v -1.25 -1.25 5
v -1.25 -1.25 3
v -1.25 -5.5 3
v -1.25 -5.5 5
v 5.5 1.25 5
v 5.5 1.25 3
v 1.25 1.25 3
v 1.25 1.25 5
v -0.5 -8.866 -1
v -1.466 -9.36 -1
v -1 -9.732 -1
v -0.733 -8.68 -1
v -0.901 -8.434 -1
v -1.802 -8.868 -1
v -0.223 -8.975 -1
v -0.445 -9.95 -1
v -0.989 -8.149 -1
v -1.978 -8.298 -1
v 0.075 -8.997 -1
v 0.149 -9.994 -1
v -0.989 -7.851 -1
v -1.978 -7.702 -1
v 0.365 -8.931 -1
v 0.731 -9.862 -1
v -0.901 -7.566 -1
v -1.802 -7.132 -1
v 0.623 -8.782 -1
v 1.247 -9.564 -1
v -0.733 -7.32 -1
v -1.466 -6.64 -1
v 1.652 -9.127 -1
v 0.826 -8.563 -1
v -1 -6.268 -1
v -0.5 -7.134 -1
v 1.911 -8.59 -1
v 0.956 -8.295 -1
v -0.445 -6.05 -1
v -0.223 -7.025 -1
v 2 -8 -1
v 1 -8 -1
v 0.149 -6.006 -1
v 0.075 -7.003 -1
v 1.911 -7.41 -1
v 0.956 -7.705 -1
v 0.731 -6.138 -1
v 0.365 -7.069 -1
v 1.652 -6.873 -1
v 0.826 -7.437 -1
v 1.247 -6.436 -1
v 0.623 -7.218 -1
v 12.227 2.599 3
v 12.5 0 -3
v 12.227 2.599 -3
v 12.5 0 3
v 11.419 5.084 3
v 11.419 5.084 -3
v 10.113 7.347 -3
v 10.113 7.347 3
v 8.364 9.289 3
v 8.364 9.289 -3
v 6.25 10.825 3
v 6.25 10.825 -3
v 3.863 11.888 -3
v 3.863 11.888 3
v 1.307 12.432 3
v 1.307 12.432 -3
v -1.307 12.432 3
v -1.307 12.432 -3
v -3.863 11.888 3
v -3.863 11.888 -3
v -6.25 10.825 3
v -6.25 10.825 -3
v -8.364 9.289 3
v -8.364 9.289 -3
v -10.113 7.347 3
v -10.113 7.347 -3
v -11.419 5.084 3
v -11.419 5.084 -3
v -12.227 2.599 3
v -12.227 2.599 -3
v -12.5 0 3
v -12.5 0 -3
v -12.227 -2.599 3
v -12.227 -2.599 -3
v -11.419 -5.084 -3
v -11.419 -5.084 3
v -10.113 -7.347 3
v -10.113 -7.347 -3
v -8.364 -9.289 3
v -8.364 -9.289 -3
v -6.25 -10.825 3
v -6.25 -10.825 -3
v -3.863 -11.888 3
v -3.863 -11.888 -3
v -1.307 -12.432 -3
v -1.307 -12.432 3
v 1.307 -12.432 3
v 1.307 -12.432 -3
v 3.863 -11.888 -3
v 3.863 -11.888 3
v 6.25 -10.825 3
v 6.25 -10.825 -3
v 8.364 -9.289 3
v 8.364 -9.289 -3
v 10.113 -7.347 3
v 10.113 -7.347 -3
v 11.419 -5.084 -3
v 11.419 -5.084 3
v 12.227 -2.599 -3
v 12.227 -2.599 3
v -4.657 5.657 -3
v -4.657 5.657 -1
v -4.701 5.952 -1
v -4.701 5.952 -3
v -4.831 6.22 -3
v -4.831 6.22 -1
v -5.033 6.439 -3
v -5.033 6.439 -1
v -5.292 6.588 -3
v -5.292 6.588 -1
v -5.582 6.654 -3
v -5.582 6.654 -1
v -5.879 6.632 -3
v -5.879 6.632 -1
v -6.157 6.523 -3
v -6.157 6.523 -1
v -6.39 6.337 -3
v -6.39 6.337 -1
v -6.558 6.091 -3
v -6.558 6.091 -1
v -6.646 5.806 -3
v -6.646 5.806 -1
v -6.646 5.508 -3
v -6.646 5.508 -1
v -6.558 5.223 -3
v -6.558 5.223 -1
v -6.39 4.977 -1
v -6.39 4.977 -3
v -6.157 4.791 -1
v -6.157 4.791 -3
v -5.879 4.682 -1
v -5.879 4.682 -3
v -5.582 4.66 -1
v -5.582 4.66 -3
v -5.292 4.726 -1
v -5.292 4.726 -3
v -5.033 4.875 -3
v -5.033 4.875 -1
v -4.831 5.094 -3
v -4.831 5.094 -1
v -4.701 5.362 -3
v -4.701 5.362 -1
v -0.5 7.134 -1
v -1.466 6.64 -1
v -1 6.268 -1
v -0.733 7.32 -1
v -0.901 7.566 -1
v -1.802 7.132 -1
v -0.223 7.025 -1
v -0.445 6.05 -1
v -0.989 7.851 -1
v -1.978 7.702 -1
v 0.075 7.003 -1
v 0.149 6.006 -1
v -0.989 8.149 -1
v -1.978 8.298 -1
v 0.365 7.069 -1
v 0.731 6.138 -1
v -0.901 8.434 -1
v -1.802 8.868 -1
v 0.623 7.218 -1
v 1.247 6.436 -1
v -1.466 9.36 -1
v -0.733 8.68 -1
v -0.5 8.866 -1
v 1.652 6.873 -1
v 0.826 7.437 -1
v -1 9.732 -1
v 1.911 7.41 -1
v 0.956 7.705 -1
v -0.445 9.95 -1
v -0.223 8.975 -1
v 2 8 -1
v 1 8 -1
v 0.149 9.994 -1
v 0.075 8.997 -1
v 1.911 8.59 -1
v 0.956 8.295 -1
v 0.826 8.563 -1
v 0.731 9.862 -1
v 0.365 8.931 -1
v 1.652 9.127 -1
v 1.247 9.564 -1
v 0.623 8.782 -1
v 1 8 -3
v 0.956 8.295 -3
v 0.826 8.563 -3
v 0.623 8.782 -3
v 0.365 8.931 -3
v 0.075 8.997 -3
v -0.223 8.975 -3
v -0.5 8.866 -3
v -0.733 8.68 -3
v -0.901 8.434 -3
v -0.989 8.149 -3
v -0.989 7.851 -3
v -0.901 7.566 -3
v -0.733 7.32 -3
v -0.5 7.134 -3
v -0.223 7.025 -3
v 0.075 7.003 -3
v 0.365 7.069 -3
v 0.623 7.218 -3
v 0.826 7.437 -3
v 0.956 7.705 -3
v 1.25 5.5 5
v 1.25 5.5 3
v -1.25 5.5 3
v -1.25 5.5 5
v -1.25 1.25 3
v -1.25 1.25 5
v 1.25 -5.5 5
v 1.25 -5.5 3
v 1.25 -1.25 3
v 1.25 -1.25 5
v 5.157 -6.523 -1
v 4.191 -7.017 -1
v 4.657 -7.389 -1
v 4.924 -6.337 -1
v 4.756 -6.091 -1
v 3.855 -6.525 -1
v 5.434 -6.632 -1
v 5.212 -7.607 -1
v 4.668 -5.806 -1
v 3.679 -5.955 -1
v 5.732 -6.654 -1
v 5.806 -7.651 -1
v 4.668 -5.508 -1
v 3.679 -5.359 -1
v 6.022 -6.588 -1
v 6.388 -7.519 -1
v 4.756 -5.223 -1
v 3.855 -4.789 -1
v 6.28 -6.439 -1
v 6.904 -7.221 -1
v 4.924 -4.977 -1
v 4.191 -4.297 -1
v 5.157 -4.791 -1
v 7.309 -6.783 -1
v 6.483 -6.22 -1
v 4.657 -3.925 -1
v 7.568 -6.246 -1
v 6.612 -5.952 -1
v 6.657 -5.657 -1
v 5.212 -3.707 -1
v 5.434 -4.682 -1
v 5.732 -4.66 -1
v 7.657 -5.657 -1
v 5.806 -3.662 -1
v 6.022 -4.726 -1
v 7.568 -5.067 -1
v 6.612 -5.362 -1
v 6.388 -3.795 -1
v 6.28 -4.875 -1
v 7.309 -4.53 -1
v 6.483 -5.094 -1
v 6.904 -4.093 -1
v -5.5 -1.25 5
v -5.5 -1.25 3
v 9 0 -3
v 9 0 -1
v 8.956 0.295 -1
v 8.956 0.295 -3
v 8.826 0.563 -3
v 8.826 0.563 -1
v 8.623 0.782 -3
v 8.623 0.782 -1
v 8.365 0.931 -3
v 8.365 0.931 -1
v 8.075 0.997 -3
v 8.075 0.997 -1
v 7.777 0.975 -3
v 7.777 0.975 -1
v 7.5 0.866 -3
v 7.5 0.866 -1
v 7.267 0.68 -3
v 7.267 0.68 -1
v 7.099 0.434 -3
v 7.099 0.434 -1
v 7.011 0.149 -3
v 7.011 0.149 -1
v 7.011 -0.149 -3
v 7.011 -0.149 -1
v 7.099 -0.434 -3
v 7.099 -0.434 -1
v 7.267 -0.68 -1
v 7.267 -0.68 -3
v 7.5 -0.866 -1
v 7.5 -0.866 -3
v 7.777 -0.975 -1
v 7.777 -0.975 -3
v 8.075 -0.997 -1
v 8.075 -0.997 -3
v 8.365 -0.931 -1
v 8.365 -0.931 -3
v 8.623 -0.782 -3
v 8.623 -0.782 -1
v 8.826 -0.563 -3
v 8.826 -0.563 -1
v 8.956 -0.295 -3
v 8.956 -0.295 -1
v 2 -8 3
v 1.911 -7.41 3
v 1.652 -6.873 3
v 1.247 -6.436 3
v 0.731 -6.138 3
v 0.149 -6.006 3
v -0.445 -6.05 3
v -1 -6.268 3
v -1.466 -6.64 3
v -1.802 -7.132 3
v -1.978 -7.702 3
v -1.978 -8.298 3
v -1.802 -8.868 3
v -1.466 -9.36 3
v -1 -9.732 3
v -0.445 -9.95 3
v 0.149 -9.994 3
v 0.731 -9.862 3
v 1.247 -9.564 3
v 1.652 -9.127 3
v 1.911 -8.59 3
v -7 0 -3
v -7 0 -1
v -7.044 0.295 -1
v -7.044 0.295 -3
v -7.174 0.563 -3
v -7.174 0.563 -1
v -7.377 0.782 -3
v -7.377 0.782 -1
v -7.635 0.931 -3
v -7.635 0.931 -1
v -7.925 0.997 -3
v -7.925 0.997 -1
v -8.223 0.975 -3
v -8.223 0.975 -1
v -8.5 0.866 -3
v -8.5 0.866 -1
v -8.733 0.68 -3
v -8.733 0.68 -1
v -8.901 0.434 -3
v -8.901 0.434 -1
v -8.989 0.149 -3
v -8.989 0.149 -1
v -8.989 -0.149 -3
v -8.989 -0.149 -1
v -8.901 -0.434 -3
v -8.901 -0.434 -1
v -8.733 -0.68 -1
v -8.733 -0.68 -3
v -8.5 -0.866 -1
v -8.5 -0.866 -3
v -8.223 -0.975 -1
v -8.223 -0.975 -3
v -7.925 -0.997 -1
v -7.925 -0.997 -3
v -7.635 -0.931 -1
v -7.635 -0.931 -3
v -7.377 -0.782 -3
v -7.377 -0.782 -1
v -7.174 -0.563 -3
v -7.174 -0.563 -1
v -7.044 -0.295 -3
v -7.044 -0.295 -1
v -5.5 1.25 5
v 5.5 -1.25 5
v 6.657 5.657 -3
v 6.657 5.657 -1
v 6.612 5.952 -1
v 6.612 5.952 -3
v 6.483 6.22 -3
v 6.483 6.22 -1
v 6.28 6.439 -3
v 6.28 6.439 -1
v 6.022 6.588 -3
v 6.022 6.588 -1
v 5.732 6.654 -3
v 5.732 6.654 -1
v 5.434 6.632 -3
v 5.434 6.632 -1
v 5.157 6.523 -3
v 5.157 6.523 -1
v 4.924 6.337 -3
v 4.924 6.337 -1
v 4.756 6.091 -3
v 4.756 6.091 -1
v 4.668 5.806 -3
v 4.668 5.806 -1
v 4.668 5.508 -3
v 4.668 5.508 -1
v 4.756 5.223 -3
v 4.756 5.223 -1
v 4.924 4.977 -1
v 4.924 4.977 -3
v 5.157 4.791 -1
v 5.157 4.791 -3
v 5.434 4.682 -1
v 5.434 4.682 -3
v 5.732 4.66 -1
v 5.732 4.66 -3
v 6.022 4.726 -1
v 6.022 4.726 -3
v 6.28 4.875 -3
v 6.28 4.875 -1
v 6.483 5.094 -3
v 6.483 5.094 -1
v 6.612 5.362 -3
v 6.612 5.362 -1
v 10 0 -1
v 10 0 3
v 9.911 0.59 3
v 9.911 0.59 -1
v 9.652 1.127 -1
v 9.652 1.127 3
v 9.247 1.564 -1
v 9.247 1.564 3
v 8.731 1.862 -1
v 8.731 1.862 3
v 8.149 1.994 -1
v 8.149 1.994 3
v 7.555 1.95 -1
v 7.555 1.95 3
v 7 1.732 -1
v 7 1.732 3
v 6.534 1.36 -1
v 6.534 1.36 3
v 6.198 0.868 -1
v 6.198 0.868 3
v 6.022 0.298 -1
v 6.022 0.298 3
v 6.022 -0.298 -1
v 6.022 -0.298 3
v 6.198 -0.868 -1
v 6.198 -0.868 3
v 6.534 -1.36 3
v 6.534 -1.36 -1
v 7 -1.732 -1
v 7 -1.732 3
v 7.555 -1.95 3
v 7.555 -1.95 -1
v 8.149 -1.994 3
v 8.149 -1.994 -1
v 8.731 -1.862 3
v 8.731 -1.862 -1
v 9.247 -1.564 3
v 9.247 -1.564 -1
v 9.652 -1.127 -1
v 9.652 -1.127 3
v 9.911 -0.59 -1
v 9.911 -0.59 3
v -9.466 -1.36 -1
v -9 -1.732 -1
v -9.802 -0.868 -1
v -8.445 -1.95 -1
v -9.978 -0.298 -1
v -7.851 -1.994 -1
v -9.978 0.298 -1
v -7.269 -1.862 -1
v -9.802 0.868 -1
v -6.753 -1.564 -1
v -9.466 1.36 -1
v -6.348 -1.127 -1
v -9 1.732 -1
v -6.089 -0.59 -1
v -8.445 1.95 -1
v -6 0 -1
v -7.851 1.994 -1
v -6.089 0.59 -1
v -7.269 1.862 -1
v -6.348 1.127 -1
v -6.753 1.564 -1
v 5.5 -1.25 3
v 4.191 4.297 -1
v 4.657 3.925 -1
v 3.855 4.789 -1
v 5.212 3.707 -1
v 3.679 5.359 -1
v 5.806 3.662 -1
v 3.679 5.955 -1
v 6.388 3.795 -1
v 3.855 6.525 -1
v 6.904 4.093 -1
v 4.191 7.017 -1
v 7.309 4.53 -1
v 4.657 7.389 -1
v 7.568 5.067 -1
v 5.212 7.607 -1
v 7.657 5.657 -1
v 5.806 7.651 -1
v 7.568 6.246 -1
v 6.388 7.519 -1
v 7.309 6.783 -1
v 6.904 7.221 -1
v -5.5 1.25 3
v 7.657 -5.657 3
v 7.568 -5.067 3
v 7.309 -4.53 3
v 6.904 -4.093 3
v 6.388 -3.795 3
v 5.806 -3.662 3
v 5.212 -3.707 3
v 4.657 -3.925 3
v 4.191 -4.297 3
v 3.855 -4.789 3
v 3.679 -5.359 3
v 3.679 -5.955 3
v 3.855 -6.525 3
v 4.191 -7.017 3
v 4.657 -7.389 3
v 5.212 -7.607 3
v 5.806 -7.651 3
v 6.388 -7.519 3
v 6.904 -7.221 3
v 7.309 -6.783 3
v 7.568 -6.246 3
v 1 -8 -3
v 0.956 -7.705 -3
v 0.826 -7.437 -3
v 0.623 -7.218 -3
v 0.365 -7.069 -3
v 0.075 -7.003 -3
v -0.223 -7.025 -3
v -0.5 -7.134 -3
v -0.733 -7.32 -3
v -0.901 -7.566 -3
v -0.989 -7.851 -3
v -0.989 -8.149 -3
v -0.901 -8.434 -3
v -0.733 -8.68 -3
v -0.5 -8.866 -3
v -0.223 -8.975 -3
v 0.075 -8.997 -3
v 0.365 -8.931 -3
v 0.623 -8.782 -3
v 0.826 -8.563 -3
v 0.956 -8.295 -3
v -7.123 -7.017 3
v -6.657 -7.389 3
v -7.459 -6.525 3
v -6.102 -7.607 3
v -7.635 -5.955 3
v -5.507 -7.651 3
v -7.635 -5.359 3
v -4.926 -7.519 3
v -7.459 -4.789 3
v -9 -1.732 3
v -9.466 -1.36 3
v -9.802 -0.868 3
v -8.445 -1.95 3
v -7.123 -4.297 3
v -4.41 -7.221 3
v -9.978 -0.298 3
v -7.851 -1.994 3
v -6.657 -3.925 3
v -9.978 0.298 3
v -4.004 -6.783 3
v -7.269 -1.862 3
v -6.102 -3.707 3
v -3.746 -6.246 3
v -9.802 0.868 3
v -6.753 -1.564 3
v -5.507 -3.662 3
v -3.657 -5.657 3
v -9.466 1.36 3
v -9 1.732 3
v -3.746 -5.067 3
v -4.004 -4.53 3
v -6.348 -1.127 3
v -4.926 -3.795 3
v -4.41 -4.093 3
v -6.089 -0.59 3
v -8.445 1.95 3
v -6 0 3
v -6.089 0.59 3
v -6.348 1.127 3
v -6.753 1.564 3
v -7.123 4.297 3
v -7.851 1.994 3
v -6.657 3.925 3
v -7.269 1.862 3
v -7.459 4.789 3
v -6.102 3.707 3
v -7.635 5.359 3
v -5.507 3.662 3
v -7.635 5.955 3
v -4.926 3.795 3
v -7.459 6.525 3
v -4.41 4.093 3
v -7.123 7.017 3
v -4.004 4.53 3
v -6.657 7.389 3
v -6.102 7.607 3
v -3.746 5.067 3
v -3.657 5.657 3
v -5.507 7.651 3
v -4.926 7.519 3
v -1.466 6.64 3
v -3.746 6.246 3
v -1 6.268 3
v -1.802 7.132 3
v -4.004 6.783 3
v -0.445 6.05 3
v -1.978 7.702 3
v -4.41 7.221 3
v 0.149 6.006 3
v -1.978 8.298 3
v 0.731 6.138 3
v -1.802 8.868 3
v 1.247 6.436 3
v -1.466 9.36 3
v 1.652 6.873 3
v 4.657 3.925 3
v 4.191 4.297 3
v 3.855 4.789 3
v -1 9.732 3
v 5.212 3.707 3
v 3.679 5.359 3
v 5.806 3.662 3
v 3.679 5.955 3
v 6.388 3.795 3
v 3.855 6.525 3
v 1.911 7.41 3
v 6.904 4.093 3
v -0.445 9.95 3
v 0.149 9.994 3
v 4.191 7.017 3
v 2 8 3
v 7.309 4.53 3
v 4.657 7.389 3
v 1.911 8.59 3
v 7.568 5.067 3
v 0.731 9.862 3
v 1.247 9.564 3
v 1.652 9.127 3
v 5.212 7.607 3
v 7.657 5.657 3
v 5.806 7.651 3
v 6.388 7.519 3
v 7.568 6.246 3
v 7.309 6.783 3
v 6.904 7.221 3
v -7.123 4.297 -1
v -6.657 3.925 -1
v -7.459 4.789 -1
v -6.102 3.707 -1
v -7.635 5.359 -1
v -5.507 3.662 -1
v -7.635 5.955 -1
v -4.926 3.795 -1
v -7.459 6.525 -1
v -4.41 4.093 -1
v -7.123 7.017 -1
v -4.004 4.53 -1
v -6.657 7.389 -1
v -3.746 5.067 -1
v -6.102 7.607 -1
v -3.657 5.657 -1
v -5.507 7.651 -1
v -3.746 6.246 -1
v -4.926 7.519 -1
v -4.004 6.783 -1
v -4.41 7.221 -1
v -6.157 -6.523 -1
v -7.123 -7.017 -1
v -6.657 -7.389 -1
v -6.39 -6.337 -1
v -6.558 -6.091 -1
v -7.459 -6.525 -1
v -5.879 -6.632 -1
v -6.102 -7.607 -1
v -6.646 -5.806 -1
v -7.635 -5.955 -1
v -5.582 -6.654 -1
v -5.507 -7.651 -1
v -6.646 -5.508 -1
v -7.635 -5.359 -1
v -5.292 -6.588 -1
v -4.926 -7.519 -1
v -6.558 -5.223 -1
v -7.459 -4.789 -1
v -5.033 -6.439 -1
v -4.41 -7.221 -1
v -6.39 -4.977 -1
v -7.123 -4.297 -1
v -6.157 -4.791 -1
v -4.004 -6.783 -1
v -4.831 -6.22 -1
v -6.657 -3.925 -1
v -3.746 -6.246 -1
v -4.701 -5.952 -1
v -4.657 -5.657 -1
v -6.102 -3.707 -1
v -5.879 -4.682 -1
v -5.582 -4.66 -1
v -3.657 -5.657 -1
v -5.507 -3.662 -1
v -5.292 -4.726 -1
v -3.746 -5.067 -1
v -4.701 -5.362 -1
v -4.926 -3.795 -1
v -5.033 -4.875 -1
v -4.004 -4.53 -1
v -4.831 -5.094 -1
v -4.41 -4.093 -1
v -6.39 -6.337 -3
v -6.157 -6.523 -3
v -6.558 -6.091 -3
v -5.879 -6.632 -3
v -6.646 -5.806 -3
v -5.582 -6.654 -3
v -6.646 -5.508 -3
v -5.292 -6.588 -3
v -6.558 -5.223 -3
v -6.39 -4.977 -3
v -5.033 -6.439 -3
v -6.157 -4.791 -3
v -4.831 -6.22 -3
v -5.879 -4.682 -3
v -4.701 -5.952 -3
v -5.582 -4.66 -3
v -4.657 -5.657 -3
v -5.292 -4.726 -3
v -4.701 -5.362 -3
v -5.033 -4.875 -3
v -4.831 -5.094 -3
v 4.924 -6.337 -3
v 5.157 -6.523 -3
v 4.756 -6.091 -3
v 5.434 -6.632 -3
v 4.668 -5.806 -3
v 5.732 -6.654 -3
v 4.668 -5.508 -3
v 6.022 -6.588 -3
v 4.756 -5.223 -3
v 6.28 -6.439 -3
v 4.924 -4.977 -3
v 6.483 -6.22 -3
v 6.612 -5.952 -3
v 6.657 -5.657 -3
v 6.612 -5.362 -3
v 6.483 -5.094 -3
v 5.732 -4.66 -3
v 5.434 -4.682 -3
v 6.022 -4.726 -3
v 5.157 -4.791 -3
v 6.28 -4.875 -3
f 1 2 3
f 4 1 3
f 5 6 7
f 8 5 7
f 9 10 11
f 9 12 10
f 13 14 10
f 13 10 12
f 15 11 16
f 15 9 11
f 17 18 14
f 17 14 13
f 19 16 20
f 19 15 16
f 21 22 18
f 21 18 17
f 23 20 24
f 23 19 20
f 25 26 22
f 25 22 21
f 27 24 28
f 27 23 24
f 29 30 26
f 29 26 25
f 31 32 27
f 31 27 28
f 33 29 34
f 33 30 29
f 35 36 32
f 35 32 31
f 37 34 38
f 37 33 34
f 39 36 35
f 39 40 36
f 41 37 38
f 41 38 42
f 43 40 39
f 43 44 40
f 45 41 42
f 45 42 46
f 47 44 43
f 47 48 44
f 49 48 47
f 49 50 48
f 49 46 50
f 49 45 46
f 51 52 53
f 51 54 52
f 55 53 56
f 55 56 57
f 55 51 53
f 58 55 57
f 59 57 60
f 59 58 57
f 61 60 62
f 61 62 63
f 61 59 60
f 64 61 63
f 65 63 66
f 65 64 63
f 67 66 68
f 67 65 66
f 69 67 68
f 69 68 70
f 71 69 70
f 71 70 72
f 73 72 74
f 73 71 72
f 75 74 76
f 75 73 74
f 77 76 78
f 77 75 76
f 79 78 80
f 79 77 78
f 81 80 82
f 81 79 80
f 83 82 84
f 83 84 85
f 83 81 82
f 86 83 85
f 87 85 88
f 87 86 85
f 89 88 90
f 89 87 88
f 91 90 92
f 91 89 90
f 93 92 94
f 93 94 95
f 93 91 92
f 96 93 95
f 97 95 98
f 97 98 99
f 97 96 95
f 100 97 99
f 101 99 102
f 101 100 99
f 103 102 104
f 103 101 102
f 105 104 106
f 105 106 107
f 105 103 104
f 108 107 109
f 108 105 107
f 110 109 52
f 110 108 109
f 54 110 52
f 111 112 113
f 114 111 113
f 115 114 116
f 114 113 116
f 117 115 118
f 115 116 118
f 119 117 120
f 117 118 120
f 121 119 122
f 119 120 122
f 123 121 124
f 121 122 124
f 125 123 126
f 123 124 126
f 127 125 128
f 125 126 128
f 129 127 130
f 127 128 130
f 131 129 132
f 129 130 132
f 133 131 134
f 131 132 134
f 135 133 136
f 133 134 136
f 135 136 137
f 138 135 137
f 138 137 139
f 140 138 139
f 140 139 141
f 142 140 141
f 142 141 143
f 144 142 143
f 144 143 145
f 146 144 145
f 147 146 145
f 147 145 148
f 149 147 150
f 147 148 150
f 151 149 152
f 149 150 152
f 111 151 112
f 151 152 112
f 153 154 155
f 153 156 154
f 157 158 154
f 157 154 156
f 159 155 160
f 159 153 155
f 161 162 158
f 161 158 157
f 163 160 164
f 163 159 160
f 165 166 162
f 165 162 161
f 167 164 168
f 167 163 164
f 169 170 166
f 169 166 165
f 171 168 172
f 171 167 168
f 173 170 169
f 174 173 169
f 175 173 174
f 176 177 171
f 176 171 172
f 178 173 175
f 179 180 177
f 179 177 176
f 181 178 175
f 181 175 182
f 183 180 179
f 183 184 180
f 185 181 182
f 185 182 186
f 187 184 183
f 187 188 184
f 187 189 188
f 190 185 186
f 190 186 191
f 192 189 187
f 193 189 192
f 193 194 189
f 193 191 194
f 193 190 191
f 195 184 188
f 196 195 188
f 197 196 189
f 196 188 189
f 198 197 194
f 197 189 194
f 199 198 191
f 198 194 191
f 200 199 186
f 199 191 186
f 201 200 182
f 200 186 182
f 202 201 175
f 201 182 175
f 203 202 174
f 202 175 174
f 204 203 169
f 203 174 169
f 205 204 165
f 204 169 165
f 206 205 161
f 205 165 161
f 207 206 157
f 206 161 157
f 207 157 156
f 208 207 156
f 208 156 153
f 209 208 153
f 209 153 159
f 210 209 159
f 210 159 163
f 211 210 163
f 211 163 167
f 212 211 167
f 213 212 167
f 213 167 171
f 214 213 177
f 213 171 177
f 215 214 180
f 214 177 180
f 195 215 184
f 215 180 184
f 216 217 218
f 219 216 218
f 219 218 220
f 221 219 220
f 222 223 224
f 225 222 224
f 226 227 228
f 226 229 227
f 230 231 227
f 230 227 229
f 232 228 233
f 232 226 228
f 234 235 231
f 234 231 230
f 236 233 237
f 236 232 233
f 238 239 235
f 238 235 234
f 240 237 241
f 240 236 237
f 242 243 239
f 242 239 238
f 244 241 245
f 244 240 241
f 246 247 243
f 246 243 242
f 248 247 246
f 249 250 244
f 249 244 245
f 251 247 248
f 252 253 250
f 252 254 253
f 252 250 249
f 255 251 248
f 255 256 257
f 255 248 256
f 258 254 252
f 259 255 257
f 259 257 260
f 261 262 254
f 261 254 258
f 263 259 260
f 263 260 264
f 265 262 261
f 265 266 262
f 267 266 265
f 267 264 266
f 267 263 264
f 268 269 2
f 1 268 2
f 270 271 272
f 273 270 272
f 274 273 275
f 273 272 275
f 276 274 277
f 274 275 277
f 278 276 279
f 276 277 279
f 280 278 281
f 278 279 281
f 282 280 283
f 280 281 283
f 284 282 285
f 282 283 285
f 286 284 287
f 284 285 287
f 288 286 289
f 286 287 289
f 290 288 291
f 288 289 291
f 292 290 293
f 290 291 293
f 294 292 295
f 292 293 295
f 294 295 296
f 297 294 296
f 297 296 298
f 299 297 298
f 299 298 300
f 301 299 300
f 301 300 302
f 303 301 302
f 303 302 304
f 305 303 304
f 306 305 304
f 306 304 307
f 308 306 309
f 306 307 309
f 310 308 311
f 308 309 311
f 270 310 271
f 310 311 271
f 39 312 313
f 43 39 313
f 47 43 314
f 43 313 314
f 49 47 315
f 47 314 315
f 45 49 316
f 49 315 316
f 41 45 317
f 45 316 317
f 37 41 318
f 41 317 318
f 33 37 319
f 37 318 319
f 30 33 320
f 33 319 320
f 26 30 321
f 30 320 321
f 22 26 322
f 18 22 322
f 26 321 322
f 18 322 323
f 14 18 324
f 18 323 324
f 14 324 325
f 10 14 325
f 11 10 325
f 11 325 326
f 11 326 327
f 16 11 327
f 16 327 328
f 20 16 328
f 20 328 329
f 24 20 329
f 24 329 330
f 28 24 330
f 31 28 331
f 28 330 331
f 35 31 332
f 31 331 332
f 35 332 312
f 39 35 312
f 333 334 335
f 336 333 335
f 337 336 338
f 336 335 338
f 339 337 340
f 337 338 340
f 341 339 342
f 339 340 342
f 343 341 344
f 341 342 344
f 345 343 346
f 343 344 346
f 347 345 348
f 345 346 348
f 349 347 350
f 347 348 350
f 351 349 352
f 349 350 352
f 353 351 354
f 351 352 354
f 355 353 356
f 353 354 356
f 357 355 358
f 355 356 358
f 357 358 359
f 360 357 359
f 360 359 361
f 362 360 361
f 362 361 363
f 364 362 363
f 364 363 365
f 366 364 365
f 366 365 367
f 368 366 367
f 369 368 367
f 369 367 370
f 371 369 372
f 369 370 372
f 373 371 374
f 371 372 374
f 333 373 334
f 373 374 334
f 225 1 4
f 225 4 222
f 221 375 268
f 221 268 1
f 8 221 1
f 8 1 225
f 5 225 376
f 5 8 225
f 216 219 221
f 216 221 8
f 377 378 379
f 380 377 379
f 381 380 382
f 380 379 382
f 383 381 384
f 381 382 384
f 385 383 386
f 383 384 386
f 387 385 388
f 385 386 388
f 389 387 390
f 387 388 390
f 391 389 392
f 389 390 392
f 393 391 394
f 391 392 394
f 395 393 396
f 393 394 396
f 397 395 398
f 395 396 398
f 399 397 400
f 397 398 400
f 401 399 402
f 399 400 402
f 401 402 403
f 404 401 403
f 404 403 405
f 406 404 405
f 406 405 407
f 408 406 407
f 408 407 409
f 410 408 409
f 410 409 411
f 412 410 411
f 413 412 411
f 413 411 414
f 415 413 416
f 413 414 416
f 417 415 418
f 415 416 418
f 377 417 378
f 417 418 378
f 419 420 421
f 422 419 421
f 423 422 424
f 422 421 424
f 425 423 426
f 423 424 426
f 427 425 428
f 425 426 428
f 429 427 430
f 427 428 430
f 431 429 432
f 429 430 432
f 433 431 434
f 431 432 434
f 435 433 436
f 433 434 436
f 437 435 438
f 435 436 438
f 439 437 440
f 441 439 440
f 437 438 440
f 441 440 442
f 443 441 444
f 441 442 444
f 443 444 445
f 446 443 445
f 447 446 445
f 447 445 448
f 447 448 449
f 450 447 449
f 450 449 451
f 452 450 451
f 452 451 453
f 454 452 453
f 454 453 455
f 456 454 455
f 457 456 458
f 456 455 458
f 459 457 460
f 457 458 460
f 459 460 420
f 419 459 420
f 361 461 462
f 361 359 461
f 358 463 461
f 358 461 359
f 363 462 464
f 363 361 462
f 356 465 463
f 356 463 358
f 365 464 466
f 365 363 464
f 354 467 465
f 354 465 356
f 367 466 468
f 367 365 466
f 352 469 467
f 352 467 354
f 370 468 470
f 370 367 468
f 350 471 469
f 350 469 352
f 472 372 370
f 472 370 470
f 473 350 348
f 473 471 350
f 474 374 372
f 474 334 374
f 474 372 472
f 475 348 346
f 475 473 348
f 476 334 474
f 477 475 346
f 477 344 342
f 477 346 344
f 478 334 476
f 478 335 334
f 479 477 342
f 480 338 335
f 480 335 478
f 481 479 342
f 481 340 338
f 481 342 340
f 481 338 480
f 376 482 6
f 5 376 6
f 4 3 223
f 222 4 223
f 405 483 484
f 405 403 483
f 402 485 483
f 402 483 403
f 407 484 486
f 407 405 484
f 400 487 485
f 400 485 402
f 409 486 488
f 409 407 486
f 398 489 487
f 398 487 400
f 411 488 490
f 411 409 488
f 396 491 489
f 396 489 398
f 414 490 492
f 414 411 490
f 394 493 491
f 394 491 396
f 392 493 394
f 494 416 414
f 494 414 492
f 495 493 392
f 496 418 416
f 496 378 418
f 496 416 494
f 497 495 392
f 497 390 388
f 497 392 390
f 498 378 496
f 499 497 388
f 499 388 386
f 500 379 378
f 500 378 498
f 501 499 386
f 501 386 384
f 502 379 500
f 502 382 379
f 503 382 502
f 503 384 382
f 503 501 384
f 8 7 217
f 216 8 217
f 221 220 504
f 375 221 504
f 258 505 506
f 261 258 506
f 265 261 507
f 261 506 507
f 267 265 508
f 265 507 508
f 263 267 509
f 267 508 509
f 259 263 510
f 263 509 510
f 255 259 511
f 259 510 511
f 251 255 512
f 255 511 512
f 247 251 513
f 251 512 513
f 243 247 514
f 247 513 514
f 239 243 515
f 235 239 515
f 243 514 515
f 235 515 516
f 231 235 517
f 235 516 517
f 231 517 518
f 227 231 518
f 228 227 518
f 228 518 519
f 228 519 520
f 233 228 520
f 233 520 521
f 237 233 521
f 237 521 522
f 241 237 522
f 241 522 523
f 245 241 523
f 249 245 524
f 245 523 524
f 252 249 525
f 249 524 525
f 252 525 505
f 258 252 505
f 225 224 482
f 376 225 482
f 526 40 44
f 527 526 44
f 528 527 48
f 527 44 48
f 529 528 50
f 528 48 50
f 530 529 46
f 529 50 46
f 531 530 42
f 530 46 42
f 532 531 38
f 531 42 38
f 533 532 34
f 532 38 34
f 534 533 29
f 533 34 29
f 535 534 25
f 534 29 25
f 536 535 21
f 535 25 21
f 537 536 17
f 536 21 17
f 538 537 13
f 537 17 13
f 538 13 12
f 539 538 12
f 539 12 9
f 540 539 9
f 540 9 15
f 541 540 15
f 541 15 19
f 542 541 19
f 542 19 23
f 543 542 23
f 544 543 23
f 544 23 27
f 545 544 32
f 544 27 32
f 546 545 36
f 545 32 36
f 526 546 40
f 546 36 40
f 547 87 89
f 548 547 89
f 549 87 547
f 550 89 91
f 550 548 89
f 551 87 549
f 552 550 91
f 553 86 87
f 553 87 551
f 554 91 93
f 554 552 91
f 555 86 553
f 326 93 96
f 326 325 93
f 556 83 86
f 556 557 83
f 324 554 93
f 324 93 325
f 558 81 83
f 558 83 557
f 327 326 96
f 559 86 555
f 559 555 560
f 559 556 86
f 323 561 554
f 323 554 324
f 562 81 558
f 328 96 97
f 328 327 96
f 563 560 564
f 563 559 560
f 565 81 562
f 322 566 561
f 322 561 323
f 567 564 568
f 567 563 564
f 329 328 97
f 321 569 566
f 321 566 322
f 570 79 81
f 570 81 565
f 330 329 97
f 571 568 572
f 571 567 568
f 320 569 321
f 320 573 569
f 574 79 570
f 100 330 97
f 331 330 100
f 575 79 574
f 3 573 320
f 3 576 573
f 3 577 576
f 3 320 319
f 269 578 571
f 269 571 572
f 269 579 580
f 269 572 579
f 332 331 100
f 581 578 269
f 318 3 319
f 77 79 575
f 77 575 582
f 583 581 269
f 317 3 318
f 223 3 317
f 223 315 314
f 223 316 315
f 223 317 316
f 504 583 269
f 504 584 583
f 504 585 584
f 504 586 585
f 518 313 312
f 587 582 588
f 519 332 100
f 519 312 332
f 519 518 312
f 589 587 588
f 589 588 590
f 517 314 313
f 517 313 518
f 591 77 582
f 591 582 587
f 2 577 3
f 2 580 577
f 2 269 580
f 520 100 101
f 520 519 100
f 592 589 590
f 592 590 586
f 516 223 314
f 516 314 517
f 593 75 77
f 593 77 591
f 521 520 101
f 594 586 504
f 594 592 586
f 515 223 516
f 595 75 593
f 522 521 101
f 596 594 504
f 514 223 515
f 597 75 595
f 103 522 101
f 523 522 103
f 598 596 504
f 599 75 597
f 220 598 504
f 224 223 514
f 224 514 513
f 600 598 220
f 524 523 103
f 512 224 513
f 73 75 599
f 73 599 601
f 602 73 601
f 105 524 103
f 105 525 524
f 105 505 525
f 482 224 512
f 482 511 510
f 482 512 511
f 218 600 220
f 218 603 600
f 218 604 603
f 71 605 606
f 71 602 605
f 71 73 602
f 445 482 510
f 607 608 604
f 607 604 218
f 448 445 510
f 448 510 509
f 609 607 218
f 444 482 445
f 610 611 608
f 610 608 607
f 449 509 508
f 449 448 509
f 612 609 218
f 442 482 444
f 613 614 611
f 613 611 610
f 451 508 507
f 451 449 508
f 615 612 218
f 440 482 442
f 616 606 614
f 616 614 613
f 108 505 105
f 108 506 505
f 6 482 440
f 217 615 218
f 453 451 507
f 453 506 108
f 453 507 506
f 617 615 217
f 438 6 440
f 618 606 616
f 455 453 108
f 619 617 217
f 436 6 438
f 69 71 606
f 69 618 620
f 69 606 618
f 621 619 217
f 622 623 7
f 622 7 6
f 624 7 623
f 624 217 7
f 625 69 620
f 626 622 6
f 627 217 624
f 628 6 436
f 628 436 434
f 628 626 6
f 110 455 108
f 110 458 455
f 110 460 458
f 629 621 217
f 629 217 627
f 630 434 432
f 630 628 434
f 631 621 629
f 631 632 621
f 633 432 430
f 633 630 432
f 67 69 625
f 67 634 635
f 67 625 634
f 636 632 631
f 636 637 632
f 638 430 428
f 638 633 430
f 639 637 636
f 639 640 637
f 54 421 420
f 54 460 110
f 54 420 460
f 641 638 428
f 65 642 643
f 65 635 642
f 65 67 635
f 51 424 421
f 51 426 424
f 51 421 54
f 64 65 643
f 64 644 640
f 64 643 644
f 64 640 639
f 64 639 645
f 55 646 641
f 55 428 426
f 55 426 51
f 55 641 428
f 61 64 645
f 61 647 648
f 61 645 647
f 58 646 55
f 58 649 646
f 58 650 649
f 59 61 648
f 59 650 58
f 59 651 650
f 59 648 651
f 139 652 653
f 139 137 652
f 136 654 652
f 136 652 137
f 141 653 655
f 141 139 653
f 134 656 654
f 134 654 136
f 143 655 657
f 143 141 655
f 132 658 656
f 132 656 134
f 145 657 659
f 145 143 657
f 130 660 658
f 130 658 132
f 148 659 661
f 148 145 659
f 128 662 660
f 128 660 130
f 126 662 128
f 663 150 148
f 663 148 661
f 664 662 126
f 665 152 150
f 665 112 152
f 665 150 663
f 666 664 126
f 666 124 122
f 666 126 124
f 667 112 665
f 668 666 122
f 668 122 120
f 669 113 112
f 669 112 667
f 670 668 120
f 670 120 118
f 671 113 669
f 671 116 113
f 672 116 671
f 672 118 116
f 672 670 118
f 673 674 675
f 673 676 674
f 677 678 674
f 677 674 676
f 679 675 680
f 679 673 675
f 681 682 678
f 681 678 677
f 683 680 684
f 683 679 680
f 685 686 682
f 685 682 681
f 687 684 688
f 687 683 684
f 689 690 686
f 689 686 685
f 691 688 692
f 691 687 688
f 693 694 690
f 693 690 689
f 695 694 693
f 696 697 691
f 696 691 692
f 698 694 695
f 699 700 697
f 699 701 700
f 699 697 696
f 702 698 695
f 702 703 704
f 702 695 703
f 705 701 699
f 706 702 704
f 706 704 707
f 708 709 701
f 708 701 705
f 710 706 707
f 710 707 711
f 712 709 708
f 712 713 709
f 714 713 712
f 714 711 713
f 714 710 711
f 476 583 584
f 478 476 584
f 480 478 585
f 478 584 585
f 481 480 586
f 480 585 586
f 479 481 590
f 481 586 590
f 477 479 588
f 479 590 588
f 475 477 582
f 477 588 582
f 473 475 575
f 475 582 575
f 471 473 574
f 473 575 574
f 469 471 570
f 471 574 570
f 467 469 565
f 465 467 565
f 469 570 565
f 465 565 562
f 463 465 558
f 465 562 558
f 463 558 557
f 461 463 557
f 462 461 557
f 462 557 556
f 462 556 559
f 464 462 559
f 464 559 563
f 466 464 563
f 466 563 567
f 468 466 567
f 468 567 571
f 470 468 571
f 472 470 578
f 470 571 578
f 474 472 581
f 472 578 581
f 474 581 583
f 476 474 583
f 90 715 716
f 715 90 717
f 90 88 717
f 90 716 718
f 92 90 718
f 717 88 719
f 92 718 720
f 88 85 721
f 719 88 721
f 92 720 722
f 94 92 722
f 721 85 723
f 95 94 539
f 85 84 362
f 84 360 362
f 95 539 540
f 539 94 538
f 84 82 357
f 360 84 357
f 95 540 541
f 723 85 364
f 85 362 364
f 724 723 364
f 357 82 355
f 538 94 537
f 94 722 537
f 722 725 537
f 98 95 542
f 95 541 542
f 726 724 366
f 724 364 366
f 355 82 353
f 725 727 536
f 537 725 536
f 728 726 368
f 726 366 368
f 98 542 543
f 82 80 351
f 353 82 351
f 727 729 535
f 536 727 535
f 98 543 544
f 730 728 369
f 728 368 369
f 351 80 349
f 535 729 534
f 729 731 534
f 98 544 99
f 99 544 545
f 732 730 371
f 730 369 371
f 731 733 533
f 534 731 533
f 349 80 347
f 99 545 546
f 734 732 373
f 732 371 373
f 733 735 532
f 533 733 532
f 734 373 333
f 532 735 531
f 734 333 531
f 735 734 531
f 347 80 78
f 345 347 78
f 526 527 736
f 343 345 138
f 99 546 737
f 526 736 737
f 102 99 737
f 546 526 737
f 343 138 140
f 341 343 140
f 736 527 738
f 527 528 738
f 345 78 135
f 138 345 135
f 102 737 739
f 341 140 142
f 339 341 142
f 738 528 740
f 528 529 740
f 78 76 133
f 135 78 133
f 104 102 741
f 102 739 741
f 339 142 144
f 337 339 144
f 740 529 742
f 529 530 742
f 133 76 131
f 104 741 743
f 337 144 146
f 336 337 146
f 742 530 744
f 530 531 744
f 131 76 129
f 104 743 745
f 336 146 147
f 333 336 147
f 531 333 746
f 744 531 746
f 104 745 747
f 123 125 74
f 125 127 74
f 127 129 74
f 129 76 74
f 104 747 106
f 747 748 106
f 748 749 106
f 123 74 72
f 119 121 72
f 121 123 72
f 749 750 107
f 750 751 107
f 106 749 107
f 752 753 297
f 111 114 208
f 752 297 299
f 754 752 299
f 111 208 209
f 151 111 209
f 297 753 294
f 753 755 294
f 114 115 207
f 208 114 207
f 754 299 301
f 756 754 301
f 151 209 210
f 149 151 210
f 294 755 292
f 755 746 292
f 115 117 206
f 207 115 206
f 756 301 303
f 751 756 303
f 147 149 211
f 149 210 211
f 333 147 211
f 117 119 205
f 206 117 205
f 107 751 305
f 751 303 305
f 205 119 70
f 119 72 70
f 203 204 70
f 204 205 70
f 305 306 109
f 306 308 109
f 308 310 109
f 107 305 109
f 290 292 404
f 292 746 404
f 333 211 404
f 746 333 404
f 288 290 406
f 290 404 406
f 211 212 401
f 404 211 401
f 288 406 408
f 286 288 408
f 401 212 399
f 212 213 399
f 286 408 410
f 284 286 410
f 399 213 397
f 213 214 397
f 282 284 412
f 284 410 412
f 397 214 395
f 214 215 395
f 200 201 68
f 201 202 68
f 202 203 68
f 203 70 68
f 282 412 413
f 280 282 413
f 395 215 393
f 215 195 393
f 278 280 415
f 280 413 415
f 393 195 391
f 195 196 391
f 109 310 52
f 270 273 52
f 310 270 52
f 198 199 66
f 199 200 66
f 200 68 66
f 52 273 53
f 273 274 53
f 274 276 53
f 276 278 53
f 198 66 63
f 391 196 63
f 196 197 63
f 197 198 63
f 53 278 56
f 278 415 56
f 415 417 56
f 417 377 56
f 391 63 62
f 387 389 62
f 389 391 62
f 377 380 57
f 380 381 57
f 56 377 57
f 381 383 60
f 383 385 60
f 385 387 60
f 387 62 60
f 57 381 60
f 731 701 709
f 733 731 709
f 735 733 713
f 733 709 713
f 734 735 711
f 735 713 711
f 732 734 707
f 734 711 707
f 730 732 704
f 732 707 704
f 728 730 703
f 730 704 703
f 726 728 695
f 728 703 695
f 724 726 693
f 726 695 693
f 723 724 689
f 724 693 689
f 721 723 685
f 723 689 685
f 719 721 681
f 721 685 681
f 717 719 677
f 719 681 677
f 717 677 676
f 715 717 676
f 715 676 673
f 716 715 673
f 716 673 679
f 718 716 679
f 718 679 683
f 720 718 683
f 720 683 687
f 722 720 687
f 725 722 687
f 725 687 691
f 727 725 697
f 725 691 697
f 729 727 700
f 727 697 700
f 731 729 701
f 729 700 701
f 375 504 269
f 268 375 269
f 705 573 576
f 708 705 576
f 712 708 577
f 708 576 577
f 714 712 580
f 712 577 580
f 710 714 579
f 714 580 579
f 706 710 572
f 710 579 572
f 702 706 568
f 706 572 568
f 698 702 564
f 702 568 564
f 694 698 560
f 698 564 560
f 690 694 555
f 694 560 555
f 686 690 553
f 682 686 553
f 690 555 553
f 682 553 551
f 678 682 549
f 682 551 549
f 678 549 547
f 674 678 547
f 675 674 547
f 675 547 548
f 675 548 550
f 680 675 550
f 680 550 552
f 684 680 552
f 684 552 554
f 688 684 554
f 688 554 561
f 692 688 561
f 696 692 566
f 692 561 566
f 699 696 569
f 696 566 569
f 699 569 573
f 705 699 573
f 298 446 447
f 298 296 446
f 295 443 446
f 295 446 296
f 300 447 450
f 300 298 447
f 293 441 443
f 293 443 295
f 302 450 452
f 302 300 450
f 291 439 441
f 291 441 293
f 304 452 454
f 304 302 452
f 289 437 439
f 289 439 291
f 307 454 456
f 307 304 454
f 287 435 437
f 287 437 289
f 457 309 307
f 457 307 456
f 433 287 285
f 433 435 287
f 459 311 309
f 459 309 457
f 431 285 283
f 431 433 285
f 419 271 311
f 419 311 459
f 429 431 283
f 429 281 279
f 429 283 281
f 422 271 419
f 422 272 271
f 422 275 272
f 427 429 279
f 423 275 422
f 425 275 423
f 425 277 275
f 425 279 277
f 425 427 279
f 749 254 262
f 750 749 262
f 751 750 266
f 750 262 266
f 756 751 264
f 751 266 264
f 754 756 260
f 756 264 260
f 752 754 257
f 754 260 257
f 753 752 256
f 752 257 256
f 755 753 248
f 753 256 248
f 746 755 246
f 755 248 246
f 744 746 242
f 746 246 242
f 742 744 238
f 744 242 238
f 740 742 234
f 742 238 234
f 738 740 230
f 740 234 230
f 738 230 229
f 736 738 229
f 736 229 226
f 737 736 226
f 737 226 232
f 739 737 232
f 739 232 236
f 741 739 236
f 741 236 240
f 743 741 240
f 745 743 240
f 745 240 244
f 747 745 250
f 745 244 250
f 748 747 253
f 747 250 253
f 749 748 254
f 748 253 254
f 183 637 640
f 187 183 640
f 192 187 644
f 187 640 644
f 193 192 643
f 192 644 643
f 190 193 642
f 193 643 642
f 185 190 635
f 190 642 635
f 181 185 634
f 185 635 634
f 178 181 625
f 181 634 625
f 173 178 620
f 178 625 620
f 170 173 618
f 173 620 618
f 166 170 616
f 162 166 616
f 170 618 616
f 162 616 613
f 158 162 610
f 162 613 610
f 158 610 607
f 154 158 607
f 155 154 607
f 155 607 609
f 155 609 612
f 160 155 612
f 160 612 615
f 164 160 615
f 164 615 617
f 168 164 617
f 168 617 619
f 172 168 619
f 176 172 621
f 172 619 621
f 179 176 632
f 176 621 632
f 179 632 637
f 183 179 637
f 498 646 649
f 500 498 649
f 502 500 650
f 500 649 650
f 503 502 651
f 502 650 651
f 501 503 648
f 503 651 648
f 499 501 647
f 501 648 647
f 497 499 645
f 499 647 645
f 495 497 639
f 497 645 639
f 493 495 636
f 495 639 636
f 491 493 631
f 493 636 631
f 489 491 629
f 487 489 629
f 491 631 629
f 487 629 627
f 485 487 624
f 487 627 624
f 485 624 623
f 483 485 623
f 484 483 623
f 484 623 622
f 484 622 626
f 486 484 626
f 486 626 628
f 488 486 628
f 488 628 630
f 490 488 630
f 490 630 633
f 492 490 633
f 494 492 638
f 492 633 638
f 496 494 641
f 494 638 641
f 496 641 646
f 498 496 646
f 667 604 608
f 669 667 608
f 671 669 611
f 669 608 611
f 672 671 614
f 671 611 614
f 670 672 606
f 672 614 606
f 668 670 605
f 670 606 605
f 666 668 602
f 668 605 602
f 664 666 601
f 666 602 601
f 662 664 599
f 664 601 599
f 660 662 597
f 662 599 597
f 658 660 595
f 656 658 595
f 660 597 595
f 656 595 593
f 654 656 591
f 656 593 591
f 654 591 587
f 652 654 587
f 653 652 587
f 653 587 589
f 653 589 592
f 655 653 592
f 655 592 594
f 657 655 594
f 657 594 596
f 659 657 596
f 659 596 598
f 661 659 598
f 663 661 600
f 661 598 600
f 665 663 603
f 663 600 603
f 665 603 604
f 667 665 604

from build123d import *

# Parameters (mm, degrees)
F0_R     = 12.5
F1_DEPTH = 3
F2_R     = 1
F3_DEPTH = 12.5
F4_R     = 2
F4_R_2   = 1
F5_DEPTH = 4
F7_DEPTH = 2


with BuildPart() as f1:
    # F0 (on Top) → F1 (new body, symmetric)
    with BuildSketch(Plane.XY):
        Circle(F0_R)
    extrude(amount=F1_DEPTH, both=True)

    # F2 (on Top) → F3 (cut, symmetric)
    with BuildSketch(Plane.XY):
        with Locations((0, -8)):
            Circle(F2_R)
        with Locations((-5.6568542495, -5.6568542495)):
            Circle(F2_R)
        with Locations((-8, 0)):
            Circle(F2_R)
        with Locations((-5.6568542495, 5.6568542495)):
            Circle(F2_R)
        with Locations((0, 8)):
            Circle(F2_R)
        with Locations((5.6568542495, 5.6568542495)):
            Circle(F2_R)
        with Locations((8, 0)):
            Circle(F2_R)
        with Locations((5.6568542495, -5.6568542495)):
            Circle(F2_R)
    extrude(amount=F3_DEPTH, both=True, mode=Mode.SUBTRACT)

    # F4 (on face) → F5 (cut)
    with BuildSketch(Plane.XY.offset(3)):
        with Locations((-5.6568542495, 5.6568542495)):
            Circle(F4_R)
        with Locations((-5.6568542495, 5.6568542495)):
            Circle(F4_R_2, mode=Mode.SUBTRACT)
        with Locations((-8, 0)):
            Circle(F4_R)
        with Locations((-8, 0)):
            Circle(F4_R_2, mode=Mode.SUBTRACT)
        with Locations((0, 8)):
            Circle(F4_R)
        with Locations((0, 8)):
            Circle(F4_R_2, mode=Mode.SUBTRACT)
        with Locations((8, 0)):
            Circle(F4_R)
        with Locations((8, 0)):
            Circle(F4_R_2, mode=Mode.SUBTRACT)
        with Locations((5.6568542495, 5.6568542495)):
            Circle(F4_R)
        with Locations((5.6568542495, 5.6568542495)):
            Circle(F4_R_2, mode=Mode.SUBTRACT)
        with Locations((5.6568542495, -5.6568542495)):
            Circle(F4_R)
        with Locations((5.6568542495, -5.6568542495)):
            Circle(F4_R_2, mode=Mode.SUBTRACT)
        with Locations((0, -8)):
            Circle(F4_R)
        with Locations((0, -8)):
            Circle(F4_R_2, mode=Mode.SUBTRACT)
        with Locations((-5.6568542495, -5.6568542495)):
            Circle(F4_R)
        with Locations((-5.6568542495, -5.6568542495)):
            Circle(F4_R_2, mode=Mode.SUBTRACT)
    extrude(amount=-F5_DEPTH, mode=Mode.SUBTRACT)

    # F6 (on face) → F7 (join)
    with BuildSketch(Plane.XY.offset(3)):
        Polygon((-0.2840909091, 1.25), (-1.25, 5.5), (-1.25, 1.25), align=None)
        Polygon((1.25, 5.5), (-1.25, 5.5), (-0.2840909091, 1.25), (1.25, 1.25), align=None)
        Polygon((-0.2840909091, 1.25), (-1.25, 1.25), (-1.25, -0.2840909091), (0, 0), align=None)
        Polygon((-1.25, -0.2840909091), (-1.25, 1.25), (-5.5, 1.25), (-5.5, -1.25), align=None)
        Polygon((1.25, 1.25), (-0.2840909091, 1.25), (0, 0), (1.25, 0.2840909091), align=None)
        Polygon((5.5, 1.25), (1.25, 1.25), (1.25, 0.2840909091), align=None)
        Polygon((0, 0), (-1.25, -0.2840909091), (-1.25, -1.25), (0.2840909091, -1.25), align=None)
        Polygon((-1.25, -1.25), (-1.25, -0.2840909091), (-5.5, -1.25), align=None)
        Polygon((1.25, 0.2840909091), (0, 0), (0.2840909091, -1.25), (1.25, -1.25), align=None)
        Polygon((5.5, 1.25), (1.25, 0.2840909091), (1.25, -1.25), (5.5, -1.25), align=None)
        Polygon((0.2840909091, -1.25), (-1.25, -1.25), (-1.25, -5.5), (1.25, -5.5), align=None)
        Polygon((1.25, -1.25), (0.2840909091, -1.25), (1.25, -5.5), align=None)
    extrude(amount=F7_DEPTH)


solid = f1.part
